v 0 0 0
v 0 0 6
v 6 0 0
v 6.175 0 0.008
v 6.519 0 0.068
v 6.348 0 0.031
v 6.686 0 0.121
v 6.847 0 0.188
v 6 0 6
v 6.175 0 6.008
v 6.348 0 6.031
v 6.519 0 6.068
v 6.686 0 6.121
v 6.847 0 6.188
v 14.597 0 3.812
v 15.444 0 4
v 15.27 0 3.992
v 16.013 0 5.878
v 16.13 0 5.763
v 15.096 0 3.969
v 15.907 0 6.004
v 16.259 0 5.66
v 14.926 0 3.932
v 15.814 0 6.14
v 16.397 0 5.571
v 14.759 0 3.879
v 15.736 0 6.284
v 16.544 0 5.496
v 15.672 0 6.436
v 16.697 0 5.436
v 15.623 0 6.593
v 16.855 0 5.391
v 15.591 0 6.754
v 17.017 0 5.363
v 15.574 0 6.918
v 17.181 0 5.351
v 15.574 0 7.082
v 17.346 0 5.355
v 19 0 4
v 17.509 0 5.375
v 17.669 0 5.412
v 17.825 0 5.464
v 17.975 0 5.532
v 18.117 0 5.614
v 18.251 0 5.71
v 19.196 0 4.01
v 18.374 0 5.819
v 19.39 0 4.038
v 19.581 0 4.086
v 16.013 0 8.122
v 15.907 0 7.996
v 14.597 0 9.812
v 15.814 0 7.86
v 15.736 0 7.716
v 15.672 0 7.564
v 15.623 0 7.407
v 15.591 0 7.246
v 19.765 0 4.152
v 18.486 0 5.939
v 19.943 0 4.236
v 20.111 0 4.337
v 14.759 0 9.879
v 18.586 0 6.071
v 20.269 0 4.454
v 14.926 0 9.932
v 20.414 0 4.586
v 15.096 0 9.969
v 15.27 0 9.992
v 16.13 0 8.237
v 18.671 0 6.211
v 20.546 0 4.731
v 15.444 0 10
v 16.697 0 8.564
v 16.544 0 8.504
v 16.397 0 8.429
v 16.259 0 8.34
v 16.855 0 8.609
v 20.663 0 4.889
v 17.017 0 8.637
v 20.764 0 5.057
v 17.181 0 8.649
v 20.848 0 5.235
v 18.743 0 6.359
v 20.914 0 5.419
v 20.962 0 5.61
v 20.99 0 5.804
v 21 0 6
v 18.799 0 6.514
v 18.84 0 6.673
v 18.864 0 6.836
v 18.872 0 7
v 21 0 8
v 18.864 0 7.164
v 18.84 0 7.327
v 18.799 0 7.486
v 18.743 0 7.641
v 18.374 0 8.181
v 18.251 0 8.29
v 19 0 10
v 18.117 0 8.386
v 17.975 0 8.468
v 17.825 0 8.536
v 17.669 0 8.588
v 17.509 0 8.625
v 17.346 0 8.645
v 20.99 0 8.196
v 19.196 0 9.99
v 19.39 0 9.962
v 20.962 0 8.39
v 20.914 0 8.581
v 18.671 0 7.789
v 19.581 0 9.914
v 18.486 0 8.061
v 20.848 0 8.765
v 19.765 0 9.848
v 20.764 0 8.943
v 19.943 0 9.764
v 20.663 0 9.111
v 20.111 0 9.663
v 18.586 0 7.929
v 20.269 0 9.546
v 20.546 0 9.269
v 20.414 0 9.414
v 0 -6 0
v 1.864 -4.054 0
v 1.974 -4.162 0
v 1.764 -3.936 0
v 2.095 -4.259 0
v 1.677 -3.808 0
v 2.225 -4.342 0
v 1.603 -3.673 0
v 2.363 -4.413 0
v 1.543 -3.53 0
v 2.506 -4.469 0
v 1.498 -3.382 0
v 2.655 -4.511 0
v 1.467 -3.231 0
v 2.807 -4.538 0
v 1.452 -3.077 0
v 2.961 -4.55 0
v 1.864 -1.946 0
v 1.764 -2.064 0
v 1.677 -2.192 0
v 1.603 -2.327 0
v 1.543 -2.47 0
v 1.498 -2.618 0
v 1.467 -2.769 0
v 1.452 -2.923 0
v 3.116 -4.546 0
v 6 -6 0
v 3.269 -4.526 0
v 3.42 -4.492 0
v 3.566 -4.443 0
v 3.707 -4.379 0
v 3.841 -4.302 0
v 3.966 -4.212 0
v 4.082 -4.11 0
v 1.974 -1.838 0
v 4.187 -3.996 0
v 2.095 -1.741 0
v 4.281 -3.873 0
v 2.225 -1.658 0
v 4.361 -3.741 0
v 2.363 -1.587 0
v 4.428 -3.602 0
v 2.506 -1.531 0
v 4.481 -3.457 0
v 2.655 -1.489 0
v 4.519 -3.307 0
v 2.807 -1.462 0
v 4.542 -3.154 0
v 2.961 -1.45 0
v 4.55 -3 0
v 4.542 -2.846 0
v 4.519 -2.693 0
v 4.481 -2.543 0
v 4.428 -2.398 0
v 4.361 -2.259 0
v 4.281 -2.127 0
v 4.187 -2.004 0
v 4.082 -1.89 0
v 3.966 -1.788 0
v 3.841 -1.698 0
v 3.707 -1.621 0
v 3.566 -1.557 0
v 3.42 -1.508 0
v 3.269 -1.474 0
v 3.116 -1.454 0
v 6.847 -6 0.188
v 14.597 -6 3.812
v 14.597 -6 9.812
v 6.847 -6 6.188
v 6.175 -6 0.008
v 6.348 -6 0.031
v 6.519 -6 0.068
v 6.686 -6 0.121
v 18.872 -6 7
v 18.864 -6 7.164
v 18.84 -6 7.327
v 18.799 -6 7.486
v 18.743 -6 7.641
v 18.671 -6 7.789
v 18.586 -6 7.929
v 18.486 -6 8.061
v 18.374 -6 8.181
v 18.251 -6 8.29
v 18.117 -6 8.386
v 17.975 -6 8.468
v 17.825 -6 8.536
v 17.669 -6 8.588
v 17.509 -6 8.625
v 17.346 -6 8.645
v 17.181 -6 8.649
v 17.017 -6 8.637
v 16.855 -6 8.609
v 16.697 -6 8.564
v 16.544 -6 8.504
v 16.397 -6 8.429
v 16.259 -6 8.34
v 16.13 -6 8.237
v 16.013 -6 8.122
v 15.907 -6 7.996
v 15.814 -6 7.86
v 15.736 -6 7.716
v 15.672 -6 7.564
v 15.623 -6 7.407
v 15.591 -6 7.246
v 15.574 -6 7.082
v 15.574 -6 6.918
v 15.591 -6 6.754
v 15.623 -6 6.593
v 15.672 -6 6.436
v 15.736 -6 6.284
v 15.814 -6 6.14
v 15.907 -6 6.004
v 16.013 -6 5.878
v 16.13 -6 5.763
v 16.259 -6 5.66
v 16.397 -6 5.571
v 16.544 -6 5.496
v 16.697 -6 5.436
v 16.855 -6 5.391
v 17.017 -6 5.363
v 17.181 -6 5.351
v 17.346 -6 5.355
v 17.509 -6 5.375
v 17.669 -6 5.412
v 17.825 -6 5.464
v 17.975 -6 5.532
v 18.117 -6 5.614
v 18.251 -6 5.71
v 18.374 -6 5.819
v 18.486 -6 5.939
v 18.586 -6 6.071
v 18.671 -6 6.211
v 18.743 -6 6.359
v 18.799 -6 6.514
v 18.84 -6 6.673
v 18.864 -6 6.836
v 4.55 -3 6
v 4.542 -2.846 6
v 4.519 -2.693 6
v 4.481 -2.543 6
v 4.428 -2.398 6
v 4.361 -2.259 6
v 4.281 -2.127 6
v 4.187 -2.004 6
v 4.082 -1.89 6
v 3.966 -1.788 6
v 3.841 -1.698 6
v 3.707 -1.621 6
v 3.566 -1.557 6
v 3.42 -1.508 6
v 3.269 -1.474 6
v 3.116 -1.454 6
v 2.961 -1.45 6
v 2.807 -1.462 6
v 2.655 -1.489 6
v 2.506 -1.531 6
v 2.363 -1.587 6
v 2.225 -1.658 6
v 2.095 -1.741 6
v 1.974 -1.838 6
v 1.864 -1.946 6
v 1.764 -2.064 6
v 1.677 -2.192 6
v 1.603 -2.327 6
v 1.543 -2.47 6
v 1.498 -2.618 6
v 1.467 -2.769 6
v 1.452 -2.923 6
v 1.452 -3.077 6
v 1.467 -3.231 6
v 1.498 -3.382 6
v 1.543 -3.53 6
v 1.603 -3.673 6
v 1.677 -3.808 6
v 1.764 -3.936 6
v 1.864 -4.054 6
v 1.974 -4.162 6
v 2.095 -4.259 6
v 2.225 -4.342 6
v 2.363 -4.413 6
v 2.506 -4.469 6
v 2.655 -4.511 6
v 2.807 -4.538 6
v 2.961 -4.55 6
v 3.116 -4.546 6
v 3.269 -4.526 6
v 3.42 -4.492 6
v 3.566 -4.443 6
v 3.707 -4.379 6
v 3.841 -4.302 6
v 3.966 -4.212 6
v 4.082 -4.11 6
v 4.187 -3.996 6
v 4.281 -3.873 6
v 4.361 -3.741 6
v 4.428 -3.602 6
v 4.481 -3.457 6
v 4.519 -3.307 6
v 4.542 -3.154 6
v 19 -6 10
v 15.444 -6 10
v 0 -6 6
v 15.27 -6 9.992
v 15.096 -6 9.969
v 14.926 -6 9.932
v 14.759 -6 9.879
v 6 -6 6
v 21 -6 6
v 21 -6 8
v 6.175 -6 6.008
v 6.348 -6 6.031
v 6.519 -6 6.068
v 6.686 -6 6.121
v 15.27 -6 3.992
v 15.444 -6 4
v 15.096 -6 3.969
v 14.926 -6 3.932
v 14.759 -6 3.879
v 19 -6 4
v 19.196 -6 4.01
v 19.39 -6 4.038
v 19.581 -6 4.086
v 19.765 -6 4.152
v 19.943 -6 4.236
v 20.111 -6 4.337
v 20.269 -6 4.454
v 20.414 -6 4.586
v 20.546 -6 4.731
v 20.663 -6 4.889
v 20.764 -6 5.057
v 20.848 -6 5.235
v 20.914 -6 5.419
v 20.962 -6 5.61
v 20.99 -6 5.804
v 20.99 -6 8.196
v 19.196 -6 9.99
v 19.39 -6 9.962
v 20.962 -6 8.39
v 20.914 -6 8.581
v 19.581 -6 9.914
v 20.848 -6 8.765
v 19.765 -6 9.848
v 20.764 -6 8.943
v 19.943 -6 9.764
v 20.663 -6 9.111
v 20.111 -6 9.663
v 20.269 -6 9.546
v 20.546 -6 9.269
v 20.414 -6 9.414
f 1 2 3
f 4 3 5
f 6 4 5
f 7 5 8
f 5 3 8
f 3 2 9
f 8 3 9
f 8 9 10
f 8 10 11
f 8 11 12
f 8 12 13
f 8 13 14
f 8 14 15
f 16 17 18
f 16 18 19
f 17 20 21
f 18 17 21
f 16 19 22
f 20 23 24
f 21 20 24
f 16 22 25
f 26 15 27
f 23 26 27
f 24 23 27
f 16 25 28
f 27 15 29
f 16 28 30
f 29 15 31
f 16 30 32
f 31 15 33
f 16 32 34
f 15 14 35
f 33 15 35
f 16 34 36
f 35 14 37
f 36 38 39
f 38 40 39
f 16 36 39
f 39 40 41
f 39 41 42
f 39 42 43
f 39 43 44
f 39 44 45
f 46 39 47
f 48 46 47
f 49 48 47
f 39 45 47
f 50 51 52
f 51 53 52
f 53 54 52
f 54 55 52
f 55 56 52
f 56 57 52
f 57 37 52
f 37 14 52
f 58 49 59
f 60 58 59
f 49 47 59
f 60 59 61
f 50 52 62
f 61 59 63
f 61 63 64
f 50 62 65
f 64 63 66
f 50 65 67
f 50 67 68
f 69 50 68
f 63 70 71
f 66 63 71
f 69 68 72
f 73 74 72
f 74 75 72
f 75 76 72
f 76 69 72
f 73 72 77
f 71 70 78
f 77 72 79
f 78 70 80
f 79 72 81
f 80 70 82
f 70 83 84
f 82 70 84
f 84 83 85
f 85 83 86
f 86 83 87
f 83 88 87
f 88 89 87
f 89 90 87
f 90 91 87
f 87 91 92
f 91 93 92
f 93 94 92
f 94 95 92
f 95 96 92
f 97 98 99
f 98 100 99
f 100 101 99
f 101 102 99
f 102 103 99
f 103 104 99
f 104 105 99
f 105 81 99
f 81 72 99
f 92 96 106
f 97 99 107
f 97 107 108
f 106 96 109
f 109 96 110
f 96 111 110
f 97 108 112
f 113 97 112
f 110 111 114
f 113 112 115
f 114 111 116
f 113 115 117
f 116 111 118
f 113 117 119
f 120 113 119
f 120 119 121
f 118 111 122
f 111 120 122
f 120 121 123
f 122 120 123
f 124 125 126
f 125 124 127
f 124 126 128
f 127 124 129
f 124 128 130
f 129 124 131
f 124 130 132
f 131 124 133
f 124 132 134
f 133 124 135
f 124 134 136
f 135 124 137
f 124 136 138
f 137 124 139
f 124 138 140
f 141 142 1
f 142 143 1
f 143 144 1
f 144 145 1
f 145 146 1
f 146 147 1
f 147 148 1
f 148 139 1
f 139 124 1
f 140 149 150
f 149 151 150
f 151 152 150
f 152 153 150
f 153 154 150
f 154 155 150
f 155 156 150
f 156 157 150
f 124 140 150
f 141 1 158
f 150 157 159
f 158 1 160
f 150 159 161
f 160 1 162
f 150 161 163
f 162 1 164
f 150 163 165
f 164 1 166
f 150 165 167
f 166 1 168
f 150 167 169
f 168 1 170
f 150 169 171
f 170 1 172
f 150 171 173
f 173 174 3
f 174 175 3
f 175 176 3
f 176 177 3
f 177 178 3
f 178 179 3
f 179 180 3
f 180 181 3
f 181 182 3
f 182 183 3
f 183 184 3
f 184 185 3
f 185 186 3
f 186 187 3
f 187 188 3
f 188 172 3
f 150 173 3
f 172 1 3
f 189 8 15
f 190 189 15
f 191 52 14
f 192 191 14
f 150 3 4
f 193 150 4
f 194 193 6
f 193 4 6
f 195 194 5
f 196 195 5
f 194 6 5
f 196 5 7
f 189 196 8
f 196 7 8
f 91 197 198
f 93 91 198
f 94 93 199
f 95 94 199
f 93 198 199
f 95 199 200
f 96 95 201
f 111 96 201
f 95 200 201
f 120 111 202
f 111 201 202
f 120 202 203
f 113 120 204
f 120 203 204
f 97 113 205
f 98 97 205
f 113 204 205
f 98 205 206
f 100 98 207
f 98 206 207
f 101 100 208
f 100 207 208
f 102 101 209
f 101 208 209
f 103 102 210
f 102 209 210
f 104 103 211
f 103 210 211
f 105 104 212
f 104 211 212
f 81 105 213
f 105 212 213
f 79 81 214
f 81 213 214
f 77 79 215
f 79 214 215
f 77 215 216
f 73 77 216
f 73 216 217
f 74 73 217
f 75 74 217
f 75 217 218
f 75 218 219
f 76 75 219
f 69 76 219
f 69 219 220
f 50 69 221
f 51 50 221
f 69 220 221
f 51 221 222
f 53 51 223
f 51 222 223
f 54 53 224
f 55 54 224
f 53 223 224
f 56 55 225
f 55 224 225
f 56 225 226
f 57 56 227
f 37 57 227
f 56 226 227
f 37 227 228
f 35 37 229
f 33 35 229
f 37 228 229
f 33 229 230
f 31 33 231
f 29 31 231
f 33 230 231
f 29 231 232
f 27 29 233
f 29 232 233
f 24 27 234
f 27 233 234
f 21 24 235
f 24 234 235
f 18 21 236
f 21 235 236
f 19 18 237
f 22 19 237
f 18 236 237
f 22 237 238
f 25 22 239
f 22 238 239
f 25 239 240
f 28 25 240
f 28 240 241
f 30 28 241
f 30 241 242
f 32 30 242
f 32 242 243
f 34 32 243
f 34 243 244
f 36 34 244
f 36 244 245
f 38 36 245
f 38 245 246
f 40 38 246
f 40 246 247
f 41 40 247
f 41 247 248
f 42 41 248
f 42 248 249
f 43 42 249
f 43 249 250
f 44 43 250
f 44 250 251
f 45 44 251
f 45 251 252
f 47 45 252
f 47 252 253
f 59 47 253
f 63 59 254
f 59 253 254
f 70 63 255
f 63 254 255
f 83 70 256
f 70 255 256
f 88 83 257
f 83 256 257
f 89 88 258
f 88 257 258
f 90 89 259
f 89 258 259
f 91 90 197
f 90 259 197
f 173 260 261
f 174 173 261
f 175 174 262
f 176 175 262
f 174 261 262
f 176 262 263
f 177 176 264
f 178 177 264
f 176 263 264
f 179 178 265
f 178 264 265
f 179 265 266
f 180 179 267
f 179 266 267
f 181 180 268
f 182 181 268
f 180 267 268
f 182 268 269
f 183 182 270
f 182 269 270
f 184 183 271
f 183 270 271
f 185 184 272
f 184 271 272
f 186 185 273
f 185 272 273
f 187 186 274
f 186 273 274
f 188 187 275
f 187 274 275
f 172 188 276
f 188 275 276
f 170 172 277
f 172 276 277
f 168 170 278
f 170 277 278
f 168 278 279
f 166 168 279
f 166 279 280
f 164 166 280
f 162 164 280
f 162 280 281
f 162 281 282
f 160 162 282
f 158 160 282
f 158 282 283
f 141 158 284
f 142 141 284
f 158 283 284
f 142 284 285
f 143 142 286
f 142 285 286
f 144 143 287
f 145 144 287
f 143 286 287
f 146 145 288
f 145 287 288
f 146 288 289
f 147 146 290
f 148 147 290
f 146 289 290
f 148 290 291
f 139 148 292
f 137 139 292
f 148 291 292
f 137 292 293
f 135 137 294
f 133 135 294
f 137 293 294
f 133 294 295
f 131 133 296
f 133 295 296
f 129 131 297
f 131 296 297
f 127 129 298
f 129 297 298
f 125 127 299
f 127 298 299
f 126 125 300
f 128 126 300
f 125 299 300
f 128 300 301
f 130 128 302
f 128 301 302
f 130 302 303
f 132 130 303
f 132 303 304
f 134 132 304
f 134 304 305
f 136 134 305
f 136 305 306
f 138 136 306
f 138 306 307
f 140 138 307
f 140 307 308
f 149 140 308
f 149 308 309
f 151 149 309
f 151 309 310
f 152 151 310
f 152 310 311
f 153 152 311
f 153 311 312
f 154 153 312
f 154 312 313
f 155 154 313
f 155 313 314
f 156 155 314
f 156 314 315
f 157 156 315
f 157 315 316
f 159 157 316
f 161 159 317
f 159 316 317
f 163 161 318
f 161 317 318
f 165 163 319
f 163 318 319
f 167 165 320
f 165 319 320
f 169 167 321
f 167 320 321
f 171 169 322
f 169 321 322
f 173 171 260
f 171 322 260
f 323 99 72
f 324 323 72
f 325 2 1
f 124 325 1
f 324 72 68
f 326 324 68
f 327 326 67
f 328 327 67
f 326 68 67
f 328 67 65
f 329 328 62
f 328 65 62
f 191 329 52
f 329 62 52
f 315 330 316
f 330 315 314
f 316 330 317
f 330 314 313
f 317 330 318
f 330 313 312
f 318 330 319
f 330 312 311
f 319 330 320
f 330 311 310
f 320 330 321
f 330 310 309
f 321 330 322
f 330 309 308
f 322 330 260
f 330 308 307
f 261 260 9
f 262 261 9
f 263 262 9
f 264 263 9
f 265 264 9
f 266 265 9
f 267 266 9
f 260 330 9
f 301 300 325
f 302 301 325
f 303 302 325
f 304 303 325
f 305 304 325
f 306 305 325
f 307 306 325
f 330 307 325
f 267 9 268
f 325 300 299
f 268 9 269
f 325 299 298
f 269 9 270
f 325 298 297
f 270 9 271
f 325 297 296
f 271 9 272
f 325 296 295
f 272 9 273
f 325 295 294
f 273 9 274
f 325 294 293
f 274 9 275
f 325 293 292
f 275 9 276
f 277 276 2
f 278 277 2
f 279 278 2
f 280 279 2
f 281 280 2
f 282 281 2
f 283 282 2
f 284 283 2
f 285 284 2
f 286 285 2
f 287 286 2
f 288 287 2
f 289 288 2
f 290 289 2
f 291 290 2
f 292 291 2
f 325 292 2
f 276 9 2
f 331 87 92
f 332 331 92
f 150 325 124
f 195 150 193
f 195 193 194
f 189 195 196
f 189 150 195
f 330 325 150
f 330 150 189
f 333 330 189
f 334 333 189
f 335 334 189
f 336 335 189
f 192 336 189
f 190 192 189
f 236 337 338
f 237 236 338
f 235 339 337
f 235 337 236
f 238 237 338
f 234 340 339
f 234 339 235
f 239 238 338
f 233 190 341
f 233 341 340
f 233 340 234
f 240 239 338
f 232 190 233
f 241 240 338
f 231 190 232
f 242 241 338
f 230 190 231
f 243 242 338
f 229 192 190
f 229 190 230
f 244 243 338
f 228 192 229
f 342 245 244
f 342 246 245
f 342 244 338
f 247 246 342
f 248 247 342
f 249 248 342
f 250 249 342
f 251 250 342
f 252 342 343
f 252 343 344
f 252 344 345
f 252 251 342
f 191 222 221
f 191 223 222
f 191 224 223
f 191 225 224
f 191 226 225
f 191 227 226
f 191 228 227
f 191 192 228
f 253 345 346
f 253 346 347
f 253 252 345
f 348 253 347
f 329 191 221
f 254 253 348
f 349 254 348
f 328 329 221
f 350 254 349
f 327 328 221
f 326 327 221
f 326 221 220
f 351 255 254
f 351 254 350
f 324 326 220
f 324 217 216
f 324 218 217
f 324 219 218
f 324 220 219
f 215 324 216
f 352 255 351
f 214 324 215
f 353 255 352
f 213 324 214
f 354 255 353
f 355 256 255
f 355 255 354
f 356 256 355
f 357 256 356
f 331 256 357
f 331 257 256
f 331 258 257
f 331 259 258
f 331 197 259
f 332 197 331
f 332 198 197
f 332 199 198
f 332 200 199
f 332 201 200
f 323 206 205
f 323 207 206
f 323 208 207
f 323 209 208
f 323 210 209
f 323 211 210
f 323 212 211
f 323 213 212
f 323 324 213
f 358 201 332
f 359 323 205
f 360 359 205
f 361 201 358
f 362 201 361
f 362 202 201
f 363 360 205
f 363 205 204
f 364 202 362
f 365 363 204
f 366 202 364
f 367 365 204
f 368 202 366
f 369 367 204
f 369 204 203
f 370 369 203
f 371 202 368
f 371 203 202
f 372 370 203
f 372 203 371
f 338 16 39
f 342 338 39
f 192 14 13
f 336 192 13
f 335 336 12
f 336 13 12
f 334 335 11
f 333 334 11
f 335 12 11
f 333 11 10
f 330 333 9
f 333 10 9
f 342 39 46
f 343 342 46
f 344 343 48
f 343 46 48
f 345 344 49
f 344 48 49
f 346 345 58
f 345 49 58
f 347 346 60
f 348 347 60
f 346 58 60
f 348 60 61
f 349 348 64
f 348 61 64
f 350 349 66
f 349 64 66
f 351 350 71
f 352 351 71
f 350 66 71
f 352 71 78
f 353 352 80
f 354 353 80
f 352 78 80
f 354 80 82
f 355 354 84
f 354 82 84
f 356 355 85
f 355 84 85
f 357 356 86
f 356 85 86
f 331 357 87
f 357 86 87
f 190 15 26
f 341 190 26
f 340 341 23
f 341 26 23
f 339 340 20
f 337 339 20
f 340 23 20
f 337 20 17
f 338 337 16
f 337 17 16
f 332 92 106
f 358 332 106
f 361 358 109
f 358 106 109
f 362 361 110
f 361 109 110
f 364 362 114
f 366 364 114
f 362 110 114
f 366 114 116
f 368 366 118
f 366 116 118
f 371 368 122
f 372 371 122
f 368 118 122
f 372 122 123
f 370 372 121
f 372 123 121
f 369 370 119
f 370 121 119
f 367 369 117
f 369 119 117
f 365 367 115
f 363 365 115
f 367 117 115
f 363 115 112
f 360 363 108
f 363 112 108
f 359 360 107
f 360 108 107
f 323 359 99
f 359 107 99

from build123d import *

# Parameters (mm, degrees)
F1_DEPTH = 6
F2_R     = 1.55
F3_DEPTH = 6
F4_R     = 1.65
F5_DEPTH = 6


with BuildPart() as f1:
    # F0 (on Front) → F1 (new body)
    with BuildSketch(Plane.XZ):
        with BuildLine():
            Line((0, 6), (0, 0))
            Line((0, 0), (6, 0))
            ThreePointArc((6, 0), (6.433861, 0.047626), (6.847059, 0.188235))
            Line((6.847059, 0.188235), (14.597386, 3.811765))
            ThreePointArc((14.597386, 3.811765), (15.010584, 3.952374), (15.444444, 4))
            Line((15.444444, 4), (19, 4))
            ThreePointArc((19, 4), (20.414214, 4.585786), (21, 6))
            Line((21, 6), (21, 8))
            ThreePointArc((21, 8), (20.414214, 9.414214), (19, 10))
            Line((19, 10), (15.444444, 10))
            ThreePointArc((15.444444, 10), (15.010584, 9.952374), (14.597386, 9.811765))
            Line((14.597386, 9.811765), (6.847059, 6.188235))
            ThreePointArc((6.847059, 6.188235), (6.433861, 6.047626), (6, 6))
            Line((6, 6), (0, 6))
        make_face()
    extrude(amount=F1_DEPTH)

    # F2 (on face) → F3 (cut, through all)
    with BuildSketch(Plane.XY.offset(6)):
        with Locations((3, -3)):
            Circle(F2_R)
    extrude(amount=-F3_DEPTH, mode=Mode.SUBTRACT)

    # F4 (on face) → F5 (cut, through all)
    with BuildSketch(Plane.XZ.offset(6)):
        with Locations((17.222222, 7)):
            Circle(F4_R)
    extrude(amount=-F5_DEPTH, mode=Mode.SUBTRACT)


solid = f1.part
